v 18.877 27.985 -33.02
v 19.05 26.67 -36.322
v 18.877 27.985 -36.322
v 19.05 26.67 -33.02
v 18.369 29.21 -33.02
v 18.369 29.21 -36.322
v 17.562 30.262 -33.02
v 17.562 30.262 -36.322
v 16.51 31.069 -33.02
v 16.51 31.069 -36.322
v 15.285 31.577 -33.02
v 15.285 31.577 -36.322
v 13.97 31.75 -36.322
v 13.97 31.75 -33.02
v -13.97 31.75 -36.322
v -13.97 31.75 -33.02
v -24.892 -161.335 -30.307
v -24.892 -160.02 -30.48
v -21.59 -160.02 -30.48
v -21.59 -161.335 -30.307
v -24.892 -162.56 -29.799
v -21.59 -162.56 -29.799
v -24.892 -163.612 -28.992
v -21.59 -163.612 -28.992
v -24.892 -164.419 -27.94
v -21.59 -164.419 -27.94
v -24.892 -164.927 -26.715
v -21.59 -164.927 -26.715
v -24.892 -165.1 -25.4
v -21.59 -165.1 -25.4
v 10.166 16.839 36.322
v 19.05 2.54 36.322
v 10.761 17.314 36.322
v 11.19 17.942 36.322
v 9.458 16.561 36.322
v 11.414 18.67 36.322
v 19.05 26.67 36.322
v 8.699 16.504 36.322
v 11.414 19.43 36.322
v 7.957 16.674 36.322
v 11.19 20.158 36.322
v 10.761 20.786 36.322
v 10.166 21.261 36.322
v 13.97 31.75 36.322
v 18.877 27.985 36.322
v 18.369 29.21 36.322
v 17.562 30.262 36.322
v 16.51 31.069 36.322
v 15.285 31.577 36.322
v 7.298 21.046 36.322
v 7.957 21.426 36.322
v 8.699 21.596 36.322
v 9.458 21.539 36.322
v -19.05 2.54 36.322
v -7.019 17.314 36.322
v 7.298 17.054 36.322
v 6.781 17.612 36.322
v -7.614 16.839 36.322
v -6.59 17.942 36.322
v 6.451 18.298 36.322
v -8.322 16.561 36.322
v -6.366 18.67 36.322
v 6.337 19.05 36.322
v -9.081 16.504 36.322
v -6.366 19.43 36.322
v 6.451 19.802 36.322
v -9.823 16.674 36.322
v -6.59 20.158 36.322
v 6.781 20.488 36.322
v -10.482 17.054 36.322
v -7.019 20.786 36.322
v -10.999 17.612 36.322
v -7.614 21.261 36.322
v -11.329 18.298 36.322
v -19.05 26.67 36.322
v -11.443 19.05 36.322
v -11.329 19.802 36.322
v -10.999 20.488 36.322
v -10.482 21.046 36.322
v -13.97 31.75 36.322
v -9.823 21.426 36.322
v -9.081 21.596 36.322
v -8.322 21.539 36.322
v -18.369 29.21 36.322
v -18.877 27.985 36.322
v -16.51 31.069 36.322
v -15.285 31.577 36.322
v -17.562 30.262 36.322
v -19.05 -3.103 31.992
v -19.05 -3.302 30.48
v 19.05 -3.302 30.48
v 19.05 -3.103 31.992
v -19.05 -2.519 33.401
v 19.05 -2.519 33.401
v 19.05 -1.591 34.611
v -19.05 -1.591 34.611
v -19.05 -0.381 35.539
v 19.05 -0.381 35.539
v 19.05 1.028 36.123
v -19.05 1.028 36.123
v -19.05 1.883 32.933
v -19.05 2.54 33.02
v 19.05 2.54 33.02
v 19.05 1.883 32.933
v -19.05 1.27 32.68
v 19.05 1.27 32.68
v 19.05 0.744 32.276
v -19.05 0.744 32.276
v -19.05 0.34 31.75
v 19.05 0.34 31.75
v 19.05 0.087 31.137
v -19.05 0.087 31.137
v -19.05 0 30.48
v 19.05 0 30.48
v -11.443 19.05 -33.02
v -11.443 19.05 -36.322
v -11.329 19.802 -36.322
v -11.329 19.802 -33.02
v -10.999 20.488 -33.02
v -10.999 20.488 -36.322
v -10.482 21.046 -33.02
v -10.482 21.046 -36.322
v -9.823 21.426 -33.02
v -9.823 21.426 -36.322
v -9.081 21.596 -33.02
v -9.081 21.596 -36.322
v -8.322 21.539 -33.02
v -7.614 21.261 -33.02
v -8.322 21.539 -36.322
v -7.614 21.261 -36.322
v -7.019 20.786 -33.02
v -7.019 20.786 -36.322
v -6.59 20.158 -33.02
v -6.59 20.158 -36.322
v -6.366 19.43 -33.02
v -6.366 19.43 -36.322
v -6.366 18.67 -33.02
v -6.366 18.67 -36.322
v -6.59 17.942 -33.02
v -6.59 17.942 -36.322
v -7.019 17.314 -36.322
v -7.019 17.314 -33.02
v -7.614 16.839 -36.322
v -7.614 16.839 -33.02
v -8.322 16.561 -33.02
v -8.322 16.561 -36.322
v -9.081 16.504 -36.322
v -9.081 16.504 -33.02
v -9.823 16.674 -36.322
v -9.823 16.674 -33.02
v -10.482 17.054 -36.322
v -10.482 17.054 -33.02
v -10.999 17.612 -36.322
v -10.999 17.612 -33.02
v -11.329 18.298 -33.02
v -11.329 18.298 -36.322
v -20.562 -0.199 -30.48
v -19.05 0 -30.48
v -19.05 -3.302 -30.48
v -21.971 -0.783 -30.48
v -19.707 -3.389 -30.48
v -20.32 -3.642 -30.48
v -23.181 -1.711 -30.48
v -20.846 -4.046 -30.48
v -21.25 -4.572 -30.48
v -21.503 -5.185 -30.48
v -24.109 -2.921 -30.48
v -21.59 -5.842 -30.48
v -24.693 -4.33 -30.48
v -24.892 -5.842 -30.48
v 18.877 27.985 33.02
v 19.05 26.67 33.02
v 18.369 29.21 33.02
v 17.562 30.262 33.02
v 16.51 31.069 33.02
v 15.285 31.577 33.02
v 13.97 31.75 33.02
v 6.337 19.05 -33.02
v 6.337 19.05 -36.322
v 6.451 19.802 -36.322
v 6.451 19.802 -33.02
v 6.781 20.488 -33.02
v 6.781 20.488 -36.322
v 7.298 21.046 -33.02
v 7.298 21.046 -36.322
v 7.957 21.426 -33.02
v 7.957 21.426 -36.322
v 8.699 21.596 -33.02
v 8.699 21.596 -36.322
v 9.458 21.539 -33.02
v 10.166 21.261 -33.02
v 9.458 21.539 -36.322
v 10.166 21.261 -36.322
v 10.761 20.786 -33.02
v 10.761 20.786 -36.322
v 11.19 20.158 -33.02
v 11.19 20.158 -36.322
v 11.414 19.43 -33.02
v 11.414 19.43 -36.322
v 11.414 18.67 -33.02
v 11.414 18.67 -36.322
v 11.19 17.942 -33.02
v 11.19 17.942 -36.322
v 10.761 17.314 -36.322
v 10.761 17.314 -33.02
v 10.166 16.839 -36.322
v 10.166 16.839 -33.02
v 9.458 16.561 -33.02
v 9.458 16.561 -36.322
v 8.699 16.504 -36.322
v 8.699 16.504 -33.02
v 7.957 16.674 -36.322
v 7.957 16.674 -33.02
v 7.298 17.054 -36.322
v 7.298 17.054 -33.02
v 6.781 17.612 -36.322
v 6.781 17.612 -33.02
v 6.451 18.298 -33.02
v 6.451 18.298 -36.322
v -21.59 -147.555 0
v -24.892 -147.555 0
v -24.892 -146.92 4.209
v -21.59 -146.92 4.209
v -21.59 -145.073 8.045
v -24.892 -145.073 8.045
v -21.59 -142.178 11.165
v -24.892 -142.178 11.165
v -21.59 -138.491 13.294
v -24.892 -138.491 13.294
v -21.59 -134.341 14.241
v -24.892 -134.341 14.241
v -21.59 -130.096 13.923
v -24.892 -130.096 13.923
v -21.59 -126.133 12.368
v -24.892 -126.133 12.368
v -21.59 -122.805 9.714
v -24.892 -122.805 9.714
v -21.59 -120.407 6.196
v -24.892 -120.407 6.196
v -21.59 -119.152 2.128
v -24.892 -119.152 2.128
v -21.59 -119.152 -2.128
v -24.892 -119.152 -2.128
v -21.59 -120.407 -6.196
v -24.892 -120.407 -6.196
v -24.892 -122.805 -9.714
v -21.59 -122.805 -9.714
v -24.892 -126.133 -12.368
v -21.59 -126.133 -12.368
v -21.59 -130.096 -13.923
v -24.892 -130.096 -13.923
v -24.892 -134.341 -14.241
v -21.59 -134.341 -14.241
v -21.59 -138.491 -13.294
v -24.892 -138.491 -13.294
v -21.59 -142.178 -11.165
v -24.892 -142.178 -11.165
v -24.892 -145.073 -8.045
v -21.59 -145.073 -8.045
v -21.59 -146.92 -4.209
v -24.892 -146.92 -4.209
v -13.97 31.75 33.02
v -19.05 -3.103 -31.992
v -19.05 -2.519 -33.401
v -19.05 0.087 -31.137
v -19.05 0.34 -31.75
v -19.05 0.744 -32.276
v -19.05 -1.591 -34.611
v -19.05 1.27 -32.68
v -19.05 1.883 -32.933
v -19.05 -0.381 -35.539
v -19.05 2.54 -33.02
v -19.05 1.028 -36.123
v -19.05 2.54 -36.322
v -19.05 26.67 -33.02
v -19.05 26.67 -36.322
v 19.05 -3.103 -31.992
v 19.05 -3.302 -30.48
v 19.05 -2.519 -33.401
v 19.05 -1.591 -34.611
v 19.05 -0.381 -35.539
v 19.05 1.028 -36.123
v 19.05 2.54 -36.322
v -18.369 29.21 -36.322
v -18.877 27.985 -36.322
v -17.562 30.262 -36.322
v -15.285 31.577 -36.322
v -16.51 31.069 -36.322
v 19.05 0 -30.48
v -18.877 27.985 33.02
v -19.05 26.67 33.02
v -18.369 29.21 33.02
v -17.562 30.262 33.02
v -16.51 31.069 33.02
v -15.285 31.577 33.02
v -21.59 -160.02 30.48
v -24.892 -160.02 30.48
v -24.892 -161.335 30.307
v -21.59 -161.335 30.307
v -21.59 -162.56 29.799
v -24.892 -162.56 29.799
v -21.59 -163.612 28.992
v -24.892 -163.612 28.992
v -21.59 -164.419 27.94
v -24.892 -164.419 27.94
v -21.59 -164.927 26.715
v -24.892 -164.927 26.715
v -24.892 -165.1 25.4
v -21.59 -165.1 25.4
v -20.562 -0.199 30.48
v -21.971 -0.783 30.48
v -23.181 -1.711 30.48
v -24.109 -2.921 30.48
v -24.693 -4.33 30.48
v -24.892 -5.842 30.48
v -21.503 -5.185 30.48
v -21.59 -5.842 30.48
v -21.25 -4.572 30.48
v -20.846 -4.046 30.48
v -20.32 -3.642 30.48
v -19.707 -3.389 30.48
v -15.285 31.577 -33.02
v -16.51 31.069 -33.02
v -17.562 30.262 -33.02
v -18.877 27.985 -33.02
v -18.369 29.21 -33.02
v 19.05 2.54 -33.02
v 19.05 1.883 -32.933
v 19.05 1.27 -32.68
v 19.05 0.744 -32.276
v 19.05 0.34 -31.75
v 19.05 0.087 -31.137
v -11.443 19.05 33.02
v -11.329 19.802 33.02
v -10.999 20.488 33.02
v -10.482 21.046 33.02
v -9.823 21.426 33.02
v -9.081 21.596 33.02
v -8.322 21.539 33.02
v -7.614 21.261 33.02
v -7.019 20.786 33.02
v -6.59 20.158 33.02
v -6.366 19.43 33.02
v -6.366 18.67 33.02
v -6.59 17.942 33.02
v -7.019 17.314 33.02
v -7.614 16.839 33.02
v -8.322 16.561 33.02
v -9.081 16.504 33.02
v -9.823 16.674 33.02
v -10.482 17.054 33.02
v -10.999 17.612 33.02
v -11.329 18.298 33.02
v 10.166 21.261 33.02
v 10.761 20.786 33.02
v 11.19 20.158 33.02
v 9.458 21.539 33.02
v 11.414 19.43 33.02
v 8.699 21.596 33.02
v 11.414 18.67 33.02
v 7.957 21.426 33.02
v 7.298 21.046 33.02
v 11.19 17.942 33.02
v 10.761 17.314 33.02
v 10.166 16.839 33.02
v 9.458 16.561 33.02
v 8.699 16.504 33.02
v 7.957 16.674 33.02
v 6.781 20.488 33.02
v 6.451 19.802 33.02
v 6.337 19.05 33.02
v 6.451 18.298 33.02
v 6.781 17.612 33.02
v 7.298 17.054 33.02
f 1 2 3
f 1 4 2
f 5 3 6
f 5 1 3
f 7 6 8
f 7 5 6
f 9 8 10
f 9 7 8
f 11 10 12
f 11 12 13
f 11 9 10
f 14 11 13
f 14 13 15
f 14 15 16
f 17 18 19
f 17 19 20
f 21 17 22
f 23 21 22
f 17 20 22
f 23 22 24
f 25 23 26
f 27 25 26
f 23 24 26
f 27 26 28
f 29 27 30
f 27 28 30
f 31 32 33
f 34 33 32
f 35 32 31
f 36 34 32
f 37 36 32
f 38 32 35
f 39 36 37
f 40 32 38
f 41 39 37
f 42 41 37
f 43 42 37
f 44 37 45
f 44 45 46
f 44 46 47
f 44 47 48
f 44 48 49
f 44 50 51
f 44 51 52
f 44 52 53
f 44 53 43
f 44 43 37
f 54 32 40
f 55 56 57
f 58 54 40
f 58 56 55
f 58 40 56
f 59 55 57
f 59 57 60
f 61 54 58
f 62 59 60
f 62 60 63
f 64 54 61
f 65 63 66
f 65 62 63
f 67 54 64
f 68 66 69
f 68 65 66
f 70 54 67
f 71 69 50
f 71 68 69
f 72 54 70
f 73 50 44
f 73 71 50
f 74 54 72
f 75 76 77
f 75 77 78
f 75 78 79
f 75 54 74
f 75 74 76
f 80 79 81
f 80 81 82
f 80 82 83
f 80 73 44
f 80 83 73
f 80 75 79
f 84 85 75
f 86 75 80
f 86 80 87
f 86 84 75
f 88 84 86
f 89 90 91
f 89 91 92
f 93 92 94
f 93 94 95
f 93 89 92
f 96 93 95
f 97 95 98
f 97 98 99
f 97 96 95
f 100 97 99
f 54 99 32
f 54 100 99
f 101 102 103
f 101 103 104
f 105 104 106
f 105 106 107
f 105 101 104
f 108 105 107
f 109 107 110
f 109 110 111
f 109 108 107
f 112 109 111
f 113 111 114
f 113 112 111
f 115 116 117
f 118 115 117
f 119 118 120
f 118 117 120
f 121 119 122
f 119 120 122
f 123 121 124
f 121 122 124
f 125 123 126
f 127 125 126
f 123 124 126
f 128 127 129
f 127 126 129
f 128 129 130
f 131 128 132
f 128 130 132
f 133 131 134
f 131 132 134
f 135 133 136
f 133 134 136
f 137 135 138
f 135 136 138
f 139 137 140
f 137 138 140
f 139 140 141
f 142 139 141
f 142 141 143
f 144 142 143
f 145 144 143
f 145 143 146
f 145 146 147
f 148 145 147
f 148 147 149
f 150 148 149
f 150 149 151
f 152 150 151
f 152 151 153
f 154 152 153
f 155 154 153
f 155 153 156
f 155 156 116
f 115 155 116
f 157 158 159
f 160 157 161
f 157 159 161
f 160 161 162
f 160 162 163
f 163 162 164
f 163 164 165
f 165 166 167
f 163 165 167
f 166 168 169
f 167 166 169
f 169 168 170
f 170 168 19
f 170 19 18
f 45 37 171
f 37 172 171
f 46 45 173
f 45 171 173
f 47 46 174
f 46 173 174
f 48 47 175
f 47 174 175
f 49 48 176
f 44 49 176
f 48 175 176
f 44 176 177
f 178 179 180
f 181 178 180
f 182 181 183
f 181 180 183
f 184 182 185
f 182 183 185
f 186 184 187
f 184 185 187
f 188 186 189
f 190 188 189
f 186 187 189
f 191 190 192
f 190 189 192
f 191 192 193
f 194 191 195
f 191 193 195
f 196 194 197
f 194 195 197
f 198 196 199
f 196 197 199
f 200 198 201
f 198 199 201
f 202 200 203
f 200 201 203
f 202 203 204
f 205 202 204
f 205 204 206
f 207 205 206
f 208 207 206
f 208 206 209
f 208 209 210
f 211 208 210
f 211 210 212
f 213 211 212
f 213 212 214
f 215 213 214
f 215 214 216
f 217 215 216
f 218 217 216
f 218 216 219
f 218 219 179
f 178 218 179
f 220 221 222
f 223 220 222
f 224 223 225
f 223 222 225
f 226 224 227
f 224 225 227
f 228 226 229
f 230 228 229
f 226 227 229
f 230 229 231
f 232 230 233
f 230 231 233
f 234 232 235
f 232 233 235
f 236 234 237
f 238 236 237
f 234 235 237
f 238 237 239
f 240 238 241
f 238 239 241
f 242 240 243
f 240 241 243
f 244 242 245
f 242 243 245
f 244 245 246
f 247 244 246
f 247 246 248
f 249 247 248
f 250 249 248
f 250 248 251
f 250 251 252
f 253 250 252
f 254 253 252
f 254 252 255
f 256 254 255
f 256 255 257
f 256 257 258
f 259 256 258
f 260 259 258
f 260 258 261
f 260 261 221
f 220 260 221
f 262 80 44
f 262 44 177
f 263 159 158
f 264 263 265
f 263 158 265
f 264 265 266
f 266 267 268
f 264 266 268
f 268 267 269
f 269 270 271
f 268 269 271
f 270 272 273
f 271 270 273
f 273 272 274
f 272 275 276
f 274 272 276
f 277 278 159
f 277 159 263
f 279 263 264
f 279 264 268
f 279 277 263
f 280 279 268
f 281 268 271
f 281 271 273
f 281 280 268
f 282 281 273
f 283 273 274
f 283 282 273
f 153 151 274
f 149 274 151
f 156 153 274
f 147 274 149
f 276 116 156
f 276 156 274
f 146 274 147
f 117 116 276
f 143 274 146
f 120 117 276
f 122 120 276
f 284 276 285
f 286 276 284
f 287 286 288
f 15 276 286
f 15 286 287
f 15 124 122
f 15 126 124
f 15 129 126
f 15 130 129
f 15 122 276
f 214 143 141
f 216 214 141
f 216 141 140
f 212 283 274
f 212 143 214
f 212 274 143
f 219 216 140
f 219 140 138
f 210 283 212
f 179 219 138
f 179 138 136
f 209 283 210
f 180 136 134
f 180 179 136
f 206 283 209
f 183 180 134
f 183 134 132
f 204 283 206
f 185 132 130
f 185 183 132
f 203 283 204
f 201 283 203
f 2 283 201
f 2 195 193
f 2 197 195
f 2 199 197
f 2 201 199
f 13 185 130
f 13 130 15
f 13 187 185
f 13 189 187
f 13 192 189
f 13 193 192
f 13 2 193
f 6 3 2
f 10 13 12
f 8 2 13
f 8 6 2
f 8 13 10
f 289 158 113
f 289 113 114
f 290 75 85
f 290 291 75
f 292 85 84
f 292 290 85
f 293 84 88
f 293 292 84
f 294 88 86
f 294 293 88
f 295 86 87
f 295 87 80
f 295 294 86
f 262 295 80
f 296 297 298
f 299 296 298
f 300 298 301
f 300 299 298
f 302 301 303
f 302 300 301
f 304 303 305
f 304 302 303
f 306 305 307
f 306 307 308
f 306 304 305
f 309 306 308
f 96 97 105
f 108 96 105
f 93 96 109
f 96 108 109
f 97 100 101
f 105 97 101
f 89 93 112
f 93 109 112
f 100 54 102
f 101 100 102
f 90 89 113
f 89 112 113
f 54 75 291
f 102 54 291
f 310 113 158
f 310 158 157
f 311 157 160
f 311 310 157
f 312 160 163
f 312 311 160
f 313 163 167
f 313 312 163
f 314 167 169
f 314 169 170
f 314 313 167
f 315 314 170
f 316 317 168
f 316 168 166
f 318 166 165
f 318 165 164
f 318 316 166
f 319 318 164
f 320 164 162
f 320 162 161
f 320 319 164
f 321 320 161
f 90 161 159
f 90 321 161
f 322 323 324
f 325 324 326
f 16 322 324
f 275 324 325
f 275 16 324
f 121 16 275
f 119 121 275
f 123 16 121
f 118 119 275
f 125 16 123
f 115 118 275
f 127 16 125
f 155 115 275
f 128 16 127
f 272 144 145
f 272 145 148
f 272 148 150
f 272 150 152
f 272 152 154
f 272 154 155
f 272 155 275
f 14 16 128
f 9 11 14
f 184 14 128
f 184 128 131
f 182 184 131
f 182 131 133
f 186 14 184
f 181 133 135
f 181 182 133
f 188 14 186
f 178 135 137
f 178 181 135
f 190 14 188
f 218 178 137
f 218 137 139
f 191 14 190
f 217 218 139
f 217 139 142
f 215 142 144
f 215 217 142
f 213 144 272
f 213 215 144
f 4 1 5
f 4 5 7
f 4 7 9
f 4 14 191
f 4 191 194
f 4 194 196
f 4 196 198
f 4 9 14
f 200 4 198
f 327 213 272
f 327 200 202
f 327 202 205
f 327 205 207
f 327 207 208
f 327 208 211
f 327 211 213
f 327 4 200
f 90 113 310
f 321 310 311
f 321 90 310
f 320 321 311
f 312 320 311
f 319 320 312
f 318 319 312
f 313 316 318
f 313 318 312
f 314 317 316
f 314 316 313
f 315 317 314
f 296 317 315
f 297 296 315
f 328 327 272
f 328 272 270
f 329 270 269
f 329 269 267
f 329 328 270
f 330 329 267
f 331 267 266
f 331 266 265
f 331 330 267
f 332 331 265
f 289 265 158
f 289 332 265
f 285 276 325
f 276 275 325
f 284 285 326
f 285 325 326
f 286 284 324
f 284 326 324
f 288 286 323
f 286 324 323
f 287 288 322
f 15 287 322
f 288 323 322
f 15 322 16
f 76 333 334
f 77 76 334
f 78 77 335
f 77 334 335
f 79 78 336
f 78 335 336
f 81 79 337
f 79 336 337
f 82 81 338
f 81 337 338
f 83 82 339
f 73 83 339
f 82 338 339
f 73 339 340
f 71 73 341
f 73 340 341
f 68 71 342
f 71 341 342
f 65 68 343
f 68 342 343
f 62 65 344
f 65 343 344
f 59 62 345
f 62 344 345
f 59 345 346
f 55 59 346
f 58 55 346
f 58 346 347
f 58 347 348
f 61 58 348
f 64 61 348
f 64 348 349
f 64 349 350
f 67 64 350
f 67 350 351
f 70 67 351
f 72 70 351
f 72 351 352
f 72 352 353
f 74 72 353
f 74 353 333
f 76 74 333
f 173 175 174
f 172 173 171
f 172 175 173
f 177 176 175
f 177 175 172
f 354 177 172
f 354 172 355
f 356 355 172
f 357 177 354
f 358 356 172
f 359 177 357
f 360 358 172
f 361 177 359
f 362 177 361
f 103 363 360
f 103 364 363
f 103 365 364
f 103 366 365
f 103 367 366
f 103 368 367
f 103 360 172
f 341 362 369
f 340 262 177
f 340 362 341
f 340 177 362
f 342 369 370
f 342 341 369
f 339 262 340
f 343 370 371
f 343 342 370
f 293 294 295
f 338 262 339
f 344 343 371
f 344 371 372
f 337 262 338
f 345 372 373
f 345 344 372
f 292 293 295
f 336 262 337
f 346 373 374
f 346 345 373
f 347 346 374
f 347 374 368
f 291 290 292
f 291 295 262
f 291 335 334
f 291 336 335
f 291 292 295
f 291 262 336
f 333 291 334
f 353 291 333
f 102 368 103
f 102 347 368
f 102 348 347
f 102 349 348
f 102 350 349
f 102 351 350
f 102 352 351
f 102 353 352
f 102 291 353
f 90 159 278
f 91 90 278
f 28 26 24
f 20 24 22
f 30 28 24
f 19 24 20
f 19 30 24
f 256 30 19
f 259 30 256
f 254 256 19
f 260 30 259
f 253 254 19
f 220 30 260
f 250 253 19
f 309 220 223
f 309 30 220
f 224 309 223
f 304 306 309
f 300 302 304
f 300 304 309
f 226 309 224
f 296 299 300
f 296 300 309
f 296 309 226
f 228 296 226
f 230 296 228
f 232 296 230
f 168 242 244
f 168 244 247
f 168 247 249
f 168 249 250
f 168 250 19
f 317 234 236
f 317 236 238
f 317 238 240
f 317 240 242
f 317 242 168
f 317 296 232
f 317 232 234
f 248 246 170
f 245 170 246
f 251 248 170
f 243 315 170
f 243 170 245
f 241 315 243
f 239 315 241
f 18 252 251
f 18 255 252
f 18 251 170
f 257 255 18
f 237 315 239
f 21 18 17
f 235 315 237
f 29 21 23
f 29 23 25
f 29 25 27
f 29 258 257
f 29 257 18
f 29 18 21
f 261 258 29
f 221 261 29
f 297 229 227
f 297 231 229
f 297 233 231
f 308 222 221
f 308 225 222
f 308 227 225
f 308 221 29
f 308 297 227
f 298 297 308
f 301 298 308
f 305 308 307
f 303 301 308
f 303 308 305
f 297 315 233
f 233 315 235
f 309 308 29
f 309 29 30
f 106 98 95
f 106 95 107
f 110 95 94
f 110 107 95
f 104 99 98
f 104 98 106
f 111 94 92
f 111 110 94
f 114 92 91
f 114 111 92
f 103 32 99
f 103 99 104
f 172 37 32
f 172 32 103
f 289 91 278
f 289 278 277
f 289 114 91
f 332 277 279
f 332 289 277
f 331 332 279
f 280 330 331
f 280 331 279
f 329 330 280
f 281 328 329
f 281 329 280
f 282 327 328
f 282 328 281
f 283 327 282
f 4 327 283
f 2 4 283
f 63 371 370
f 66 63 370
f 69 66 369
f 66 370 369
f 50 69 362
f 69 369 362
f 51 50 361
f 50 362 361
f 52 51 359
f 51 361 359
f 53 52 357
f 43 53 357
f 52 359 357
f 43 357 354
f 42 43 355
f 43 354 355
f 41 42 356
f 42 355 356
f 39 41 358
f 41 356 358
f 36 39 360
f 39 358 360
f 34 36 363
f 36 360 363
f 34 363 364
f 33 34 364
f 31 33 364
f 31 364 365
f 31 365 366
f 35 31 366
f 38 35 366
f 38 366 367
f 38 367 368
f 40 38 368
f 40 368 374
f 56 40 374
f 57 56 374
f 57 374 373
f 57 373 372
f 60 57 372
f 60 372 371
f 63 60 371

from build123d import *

# Parameters (mm, degrees)
SKETCH1_W               = 38.1
SKETCH1_H               = 60.96
BASE_FLANGE1_DEPTH      = 3.302
EDGE_FLANGE1_DEPTH      = 38.1
EDGE_FLANGE1_BEND_DEPTH = 38.1
EDGE_FLANGE2_DEPTH      = 60.96
SKETCH17_R              = 14.28115
CUT_EXTRUDE1_DEPTH      = 175.665958469
F_1_4_20_TAPPED_HOLE1_D = 5.1054
FILLET1_R               = 5.08


# Sheet-metal steps are written as plain solids
with BuildPart() as part:
    # Sketch1 → Base-Flange1 (new body)
    with BuildSketch(Plane(origin=(0, 0, 0), x_dir=(1, 0, 0), z_dir=(0, 1, 0))):
        Rectangle(SKETCH1_W, SKETCH1_H)
    extrude(amount=-BASE_FLANGE1_DEPTH)

    # Edge-Flange1 section (across the edge) → Edge-Flange1 (add)
    with BuildSketch(Plane(origin=(-19.05, 0, 33.02), x_dir=(0, 0, -1), z_dir=(1, 0, 0))):
        with BuildLine():
            Line((-3.302, 2.54), (-3.302, 31.75))
            Line((-3.302, 31.75), (0, 31.75))
            Line((0, 31.75), (0, 2.54))
            ThreePointArc((0, 2.54), (0.743948776, 0.743948776), (2.54, 0))
            Line((2.54, 0), (2.54, -3.302))
            ThreePointArc((2.54, -3.302), (-1.590917816, -1.590917816), (-3.302, 2.54))
        make_face()
    extrude(amount=EDGE_FLANGE1_DEPTH)

    # Edge-Flange1 section 2 (across the edge) → Edge-Flange1 bend (add)
    with BuildSketch(Plane(origin=(19.05, 0, -33.02), x_dir=(0, 0, 1), z_dir=(-1, 0, 0))):
        with BuildLine():
            Line((-3.302, 2.54), (-3.302, 31.75))
            Line((-3.302, 31.75), (0, 31.75))
            Line((0, 31.75), (0, 2.54))
            ThreePointArc((0, 2.54), (0.743948776, 0.743948776), (2.54, 0))
            Line((2.54, 0), (2.54, -3.302))
            ThreePointArc((2.54, -3.302), (-1.590917816, -1.590917816), (-3.302, 2.54))
        make_face()
    extrude(amount=EDGE_FLANGE1_BEND_DEPTH)

    # Edge-Flange2 section (across the edge) → Edge-Flange2 (add)
    with BuildSketch(Plane(origin=(-21.59, -3.302, 30.48), x_dir=(1, 0, 0), z_dir=(0, 0, -1))):
        with BuildLine():
            Line((-3.302, 2.54), (-3.302, 161.798))
            Line((-3.302, 161.798), (0, 161.798))
            Line((0, 161.798), (0, 2.54))
            ThreePointArc((0, 2.54), (0.743948776, 0.743948776), (2.54, 0))
            Line((2.54, 0), (2.54, -3.302))
            ThreePointArc((2.54, -3.302), (-1.590917816, -1.590917816), (-3.302, 2.54))
        make_face()
    extrude(amount=EDGE_FLANGE2_DEPTH)

    # Sketch17 → Cut-Extrude1 (cut, through all)
    with BuildSketch(Plane.ZY.offset(24.892)):
        with Locations(Location((0, -133.2738, 0), (0, 0, 270))):
            Circle(SKETCH17_R)
    extrude(amount=-CUT_EXTRUDE1_DEPTH, mode=Mode.SUBTRACT)

    # 1/4-20 Tapped Hole1 (through all)
    with Locations(Plane.XY.offset(36.322)):
        with Locations((8.89, 19.05), (-8.89, 19.05)):
            Hole(F_1_4_20_TAPPED_HOLE1_D / 2)

    # Fillet1
    fillet1_edges = [part.edges().sort_by_distance(p)[0] for p in [
        (-19.05, 31.75, 34.671),
        (19.05, 31.75, 34.671),
        (19.05, 31.75, -34.671),
        (-19.05, 31.75, -34.671),
        (-23.241, -165.1, 30.48),
        (-23.241, -165.1, -30.48),
    ]]
    fillet(fillet1_edges, radius=FILLET1_R)


solid = part.part
